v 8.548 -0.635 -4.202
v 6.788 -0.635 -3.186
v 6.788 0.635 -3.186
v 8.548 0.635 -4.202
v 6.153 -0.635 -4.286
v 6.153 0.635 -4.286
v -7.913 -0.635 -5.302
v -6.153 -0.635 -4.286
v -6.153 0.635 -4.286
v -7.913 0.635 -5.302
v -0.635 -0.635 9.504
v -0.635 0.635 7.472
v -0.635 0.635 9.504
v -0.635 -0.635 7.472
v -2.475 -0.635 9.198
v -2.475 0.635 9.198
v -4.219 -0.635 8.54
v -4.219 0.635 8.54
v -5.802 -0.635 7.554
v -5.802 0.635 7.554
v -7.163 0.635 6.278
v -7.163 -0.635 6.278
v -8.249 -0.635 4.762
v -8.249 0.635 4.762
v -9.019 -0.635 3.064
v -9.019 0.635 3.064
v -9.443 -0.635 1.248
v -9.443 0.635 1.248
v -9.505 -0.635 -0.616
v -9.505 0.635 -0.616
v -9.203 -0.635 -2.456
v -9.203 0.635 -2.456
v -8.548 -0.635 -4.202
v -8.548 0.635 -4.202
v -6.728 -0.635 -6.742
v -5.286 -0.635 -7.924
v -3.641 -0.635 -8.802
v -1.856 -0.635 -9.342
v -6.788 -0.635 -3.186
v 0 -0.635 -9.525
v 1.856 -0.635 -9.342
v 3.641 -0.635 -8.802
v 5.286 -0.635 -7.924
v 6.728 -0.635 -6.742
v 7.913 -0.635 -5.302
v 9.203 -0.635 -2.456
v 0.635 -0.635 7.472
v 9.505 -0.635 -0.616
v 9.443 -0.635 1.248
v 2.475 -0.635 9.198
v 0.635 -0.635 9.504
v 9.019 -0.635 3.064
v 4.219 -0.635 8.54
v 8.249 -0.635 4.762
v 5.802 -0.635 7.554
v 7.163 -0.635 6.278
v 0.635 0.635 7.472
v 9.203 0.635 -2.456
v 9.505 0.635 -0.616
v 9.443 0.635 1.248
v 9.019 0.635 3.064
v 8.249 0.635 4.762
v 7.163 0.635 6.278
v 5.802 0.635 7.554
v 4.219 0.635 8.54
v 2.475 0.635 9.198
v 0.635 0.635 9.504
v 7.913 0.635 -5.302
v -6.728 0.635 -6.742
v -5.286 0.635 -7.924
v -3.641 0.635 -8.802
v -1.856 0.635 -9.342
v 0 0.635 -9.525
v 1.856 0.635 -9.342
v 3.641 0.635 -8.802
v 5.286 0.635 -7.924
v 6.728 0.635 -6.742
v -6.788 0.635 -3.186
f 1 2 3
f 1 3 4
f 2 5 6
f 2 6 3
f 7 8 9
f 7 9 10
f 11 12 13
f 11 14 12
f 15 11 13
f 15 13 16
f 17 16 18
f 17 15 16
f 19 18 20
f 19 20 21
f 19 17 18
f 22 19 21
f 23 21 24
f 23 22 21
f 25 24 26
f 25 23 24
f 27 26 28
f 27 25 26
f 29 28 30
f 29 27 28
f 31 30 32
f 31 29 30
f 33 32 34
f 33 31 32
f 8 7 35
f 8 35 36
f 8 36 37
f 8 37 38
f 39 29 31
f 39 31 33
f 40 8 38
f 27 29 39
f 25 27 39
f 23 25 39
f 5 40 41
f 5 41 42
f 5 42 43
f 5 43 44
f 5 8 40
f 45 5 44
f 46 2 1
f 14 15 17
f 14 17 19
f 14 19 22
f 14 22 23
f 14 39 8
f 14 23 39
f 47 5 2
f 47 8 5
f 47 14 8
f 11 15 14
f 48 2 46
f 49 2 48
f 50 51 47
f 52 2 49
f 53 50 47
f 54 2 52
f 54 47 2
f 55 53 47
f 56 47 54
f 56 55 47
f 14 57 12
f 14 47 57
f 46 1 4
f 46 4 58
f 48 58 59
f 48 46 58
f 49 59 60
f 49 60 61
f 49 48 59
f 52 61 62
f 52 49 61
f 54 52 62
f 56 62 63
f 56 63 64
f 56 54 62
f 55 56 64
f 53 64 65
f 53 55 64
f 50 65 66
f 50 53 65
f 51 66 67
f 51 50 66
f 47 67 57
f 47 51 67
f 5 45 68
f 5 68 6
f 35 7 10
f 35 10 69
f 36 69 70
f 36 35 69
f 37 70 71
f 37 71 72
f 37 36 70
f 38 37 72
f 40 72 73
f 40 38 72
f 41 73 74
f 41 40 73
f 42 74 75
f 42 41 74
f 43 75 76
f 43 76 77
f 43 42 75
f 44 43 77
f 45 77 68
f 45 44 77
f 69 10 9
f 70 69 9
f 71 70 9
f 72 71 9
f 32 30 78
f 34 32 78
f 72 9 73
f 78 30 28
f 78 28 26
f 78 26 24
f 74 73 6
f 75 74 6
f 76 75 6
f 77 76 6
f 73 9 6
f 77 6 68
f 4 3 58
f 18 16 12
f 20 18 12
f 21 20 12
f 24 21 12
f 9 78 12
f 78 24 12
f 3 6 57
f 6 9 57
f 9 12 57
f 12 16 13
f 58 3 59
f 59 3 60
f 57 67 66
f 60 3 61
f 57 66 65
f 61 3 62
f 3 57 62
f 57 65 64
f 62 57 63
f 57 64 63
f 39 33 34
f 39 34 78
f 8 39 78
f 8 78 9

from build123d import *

# Parameters (mm, degrees)
F1_DEPTH = 0.635


with BuildPart() as f1:
    # F0 (on Front) → F1 (new body, symmetric)
    with BuildSketch(Plane.XZ):
        with BuildLine():
            Line((-0.635, 7.47181), (-0.635, 9.50381))
            ThreePointArc((-0.635, 9.50381), (-8.248892, 4.7625), (-8.548041, -4.201979))
            Line((-8.548041, -4.201979), (-6.788277, -3.185979))
            Line((-6.788277, -3.185979), (-6.153277, -4.285831))
            Line((-6.153277, -4.285831), (-7.913041, -5.301831))
            ThreePointArc((-7.913041, -5.301831), (0, -9.525), (7.913041, -5.301831))
            Line((7.913041, -5.301831), (6.153277, -4.285831))
            Line((6.153277, -4.285831), (6.788277, -3.185979))
            Line((6.788277, -3.185979), (8.548041, -4.201979))
            ThreePointArc((8.548041, -4.201979), (8.248892, 4.7625), (0.635, 9.50381))
            Line((0.635, 9.50381), (0.635, 7.47181))
            Line((0.635, 7.47181), (-0.635, 7.47181))
        make_face()
    extrude(amount=F1_DEPTH, both=True)


solid = f1.part
